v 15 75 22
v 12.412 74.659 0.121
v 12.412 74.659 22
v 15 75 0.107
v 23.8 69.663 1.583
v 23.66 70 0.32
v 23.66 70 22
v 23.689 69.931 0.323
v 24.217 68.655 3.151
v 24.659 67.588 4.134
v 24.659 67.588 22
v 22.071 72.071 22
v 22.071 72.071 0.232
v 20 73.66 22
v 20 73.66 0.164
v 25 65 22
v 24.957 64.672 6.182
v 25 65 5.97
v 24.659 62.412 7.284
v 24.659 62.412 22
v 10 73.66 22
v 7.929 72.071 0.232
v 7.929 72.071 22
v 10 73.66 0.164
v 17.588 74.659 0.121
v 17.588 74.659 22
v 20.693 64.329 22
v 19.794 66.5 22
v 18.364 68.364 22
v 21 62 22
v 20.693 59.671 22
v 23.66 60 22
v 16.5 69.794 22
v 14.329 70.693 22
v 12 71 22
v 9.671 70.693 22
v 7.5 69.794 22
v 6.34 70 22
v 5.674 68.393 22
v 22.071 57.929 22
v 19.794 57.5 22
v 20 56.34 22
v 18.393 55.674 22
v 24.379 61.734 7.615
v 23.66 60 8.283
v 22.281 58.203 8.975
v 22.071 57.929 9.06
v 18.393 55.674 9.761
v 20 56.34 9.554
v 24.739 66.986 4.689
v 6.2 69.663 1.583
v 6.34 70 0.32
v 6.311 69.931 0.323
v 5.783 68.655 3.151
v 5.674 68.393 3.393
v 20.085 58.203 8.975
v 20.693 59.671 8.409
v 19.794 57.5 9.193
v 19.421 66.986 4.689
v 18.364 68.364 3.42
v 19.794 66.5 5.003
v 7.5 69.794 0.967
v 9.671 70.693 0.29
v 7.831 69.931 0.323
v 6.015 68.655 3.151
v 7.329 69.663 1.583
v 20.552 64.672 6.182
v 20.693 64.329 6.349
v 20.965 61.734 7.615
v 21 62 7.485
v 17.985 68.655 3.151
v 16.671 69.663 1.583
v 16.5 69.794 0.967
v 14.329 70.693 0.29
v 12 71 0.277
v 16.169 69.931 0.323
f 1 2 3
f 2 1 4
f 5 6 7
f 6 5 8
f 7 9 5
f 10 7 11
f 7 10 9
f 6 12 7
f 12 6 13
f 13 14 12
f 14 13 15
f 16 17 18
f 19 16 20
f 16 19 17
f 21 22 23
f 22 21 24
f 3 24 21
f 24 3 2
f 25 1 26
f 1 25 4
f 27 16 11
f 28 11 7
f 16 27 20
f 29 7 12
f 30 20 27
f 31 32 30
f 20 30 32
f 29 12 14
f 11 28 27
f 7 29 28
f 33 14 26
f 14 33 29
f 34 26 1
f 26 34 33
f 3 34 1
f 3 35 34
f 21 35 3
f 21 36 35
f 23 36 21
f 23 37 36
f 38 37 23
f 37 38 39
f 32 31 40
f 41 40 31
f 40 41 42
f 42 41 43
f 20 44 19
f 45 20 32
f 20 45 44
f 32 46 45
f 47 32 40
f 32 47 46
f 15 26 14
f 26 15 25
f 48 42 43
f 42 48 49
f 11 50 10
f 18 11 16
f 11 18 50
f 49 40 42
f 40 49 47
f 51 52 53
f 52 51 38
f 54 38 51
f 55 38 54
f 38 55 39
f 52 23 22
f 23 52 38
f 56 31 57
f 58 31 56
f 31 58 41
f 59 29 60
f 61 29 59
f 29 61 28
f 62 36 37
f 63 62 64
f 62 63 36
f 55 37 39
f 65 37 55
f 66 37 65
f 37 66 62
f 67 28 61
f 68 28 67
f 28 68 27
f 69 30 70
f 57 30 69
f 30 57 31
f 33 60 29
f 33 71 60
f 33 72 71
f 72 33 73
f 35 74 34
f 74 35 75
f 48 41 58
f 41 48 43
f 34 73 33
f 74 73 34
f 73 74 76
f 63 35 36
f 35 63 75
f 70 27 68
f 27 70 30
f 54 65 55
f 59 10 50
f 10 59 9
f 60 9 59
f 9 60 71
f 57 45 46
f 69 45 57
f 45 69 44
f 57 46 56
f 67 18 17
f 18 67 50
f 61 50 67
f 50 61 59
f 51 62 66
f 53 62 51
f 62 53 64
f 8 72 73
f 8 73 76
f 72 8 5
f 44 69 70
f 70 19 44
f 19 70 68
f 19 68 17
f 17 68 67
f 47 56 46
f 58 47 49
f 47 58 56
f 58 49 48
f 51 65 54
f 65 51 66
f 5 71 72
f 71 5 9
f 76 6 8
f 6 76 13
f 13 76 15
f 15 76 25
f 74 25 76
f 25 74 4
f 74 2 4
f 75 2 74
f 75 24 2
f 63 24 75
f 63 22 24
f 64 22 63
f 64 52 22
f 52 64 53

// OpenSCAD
module doorbell_holder() {
    difference() {
        rounded_box([50,150], 22, [10,10]);
        rounded_box([42,142], 24, [9,9]);
        translate([-30,0,]) scale([1, 1, 15/65]) rotate([0,90,0])
        cylinder(d=140, h=60, $fn=64);
        hull() {
            translate([25,75,-10]) cylinder(d=5, h=10, $fn=4);
            translate([-25,75,-10]) cylinder(d=5, h=10, $fn=4);
            translate([25,-75,-3.6]) cylinder(d=5, h=10, $fn=4);
            translate([-25,-75,-7.6]) cylinder(d=5, h=10, $fn=4);
        }
    }
}

module rounded_box(size, height, corner_radius, segments=24){
    max_radius = max(corner_radius);
    hull() cornercopy([size.x, size.y]/2 - [max_radius, max_radius]) {
        cylinder(r1=corner_radius[0], r2=corner_radius[1], h=height, $fn=segments);
    }
}

module cornercopy(offset) {
  for (xx=[-1, 1]) for (yy=[-1, 1])
    scale([xx,yy, 1]) translate([offset.x * xx, offset.y * yy, 0]) children();
}

//output:doorbell_holder:doorbell_holder();

//view
doorbell_holder();
